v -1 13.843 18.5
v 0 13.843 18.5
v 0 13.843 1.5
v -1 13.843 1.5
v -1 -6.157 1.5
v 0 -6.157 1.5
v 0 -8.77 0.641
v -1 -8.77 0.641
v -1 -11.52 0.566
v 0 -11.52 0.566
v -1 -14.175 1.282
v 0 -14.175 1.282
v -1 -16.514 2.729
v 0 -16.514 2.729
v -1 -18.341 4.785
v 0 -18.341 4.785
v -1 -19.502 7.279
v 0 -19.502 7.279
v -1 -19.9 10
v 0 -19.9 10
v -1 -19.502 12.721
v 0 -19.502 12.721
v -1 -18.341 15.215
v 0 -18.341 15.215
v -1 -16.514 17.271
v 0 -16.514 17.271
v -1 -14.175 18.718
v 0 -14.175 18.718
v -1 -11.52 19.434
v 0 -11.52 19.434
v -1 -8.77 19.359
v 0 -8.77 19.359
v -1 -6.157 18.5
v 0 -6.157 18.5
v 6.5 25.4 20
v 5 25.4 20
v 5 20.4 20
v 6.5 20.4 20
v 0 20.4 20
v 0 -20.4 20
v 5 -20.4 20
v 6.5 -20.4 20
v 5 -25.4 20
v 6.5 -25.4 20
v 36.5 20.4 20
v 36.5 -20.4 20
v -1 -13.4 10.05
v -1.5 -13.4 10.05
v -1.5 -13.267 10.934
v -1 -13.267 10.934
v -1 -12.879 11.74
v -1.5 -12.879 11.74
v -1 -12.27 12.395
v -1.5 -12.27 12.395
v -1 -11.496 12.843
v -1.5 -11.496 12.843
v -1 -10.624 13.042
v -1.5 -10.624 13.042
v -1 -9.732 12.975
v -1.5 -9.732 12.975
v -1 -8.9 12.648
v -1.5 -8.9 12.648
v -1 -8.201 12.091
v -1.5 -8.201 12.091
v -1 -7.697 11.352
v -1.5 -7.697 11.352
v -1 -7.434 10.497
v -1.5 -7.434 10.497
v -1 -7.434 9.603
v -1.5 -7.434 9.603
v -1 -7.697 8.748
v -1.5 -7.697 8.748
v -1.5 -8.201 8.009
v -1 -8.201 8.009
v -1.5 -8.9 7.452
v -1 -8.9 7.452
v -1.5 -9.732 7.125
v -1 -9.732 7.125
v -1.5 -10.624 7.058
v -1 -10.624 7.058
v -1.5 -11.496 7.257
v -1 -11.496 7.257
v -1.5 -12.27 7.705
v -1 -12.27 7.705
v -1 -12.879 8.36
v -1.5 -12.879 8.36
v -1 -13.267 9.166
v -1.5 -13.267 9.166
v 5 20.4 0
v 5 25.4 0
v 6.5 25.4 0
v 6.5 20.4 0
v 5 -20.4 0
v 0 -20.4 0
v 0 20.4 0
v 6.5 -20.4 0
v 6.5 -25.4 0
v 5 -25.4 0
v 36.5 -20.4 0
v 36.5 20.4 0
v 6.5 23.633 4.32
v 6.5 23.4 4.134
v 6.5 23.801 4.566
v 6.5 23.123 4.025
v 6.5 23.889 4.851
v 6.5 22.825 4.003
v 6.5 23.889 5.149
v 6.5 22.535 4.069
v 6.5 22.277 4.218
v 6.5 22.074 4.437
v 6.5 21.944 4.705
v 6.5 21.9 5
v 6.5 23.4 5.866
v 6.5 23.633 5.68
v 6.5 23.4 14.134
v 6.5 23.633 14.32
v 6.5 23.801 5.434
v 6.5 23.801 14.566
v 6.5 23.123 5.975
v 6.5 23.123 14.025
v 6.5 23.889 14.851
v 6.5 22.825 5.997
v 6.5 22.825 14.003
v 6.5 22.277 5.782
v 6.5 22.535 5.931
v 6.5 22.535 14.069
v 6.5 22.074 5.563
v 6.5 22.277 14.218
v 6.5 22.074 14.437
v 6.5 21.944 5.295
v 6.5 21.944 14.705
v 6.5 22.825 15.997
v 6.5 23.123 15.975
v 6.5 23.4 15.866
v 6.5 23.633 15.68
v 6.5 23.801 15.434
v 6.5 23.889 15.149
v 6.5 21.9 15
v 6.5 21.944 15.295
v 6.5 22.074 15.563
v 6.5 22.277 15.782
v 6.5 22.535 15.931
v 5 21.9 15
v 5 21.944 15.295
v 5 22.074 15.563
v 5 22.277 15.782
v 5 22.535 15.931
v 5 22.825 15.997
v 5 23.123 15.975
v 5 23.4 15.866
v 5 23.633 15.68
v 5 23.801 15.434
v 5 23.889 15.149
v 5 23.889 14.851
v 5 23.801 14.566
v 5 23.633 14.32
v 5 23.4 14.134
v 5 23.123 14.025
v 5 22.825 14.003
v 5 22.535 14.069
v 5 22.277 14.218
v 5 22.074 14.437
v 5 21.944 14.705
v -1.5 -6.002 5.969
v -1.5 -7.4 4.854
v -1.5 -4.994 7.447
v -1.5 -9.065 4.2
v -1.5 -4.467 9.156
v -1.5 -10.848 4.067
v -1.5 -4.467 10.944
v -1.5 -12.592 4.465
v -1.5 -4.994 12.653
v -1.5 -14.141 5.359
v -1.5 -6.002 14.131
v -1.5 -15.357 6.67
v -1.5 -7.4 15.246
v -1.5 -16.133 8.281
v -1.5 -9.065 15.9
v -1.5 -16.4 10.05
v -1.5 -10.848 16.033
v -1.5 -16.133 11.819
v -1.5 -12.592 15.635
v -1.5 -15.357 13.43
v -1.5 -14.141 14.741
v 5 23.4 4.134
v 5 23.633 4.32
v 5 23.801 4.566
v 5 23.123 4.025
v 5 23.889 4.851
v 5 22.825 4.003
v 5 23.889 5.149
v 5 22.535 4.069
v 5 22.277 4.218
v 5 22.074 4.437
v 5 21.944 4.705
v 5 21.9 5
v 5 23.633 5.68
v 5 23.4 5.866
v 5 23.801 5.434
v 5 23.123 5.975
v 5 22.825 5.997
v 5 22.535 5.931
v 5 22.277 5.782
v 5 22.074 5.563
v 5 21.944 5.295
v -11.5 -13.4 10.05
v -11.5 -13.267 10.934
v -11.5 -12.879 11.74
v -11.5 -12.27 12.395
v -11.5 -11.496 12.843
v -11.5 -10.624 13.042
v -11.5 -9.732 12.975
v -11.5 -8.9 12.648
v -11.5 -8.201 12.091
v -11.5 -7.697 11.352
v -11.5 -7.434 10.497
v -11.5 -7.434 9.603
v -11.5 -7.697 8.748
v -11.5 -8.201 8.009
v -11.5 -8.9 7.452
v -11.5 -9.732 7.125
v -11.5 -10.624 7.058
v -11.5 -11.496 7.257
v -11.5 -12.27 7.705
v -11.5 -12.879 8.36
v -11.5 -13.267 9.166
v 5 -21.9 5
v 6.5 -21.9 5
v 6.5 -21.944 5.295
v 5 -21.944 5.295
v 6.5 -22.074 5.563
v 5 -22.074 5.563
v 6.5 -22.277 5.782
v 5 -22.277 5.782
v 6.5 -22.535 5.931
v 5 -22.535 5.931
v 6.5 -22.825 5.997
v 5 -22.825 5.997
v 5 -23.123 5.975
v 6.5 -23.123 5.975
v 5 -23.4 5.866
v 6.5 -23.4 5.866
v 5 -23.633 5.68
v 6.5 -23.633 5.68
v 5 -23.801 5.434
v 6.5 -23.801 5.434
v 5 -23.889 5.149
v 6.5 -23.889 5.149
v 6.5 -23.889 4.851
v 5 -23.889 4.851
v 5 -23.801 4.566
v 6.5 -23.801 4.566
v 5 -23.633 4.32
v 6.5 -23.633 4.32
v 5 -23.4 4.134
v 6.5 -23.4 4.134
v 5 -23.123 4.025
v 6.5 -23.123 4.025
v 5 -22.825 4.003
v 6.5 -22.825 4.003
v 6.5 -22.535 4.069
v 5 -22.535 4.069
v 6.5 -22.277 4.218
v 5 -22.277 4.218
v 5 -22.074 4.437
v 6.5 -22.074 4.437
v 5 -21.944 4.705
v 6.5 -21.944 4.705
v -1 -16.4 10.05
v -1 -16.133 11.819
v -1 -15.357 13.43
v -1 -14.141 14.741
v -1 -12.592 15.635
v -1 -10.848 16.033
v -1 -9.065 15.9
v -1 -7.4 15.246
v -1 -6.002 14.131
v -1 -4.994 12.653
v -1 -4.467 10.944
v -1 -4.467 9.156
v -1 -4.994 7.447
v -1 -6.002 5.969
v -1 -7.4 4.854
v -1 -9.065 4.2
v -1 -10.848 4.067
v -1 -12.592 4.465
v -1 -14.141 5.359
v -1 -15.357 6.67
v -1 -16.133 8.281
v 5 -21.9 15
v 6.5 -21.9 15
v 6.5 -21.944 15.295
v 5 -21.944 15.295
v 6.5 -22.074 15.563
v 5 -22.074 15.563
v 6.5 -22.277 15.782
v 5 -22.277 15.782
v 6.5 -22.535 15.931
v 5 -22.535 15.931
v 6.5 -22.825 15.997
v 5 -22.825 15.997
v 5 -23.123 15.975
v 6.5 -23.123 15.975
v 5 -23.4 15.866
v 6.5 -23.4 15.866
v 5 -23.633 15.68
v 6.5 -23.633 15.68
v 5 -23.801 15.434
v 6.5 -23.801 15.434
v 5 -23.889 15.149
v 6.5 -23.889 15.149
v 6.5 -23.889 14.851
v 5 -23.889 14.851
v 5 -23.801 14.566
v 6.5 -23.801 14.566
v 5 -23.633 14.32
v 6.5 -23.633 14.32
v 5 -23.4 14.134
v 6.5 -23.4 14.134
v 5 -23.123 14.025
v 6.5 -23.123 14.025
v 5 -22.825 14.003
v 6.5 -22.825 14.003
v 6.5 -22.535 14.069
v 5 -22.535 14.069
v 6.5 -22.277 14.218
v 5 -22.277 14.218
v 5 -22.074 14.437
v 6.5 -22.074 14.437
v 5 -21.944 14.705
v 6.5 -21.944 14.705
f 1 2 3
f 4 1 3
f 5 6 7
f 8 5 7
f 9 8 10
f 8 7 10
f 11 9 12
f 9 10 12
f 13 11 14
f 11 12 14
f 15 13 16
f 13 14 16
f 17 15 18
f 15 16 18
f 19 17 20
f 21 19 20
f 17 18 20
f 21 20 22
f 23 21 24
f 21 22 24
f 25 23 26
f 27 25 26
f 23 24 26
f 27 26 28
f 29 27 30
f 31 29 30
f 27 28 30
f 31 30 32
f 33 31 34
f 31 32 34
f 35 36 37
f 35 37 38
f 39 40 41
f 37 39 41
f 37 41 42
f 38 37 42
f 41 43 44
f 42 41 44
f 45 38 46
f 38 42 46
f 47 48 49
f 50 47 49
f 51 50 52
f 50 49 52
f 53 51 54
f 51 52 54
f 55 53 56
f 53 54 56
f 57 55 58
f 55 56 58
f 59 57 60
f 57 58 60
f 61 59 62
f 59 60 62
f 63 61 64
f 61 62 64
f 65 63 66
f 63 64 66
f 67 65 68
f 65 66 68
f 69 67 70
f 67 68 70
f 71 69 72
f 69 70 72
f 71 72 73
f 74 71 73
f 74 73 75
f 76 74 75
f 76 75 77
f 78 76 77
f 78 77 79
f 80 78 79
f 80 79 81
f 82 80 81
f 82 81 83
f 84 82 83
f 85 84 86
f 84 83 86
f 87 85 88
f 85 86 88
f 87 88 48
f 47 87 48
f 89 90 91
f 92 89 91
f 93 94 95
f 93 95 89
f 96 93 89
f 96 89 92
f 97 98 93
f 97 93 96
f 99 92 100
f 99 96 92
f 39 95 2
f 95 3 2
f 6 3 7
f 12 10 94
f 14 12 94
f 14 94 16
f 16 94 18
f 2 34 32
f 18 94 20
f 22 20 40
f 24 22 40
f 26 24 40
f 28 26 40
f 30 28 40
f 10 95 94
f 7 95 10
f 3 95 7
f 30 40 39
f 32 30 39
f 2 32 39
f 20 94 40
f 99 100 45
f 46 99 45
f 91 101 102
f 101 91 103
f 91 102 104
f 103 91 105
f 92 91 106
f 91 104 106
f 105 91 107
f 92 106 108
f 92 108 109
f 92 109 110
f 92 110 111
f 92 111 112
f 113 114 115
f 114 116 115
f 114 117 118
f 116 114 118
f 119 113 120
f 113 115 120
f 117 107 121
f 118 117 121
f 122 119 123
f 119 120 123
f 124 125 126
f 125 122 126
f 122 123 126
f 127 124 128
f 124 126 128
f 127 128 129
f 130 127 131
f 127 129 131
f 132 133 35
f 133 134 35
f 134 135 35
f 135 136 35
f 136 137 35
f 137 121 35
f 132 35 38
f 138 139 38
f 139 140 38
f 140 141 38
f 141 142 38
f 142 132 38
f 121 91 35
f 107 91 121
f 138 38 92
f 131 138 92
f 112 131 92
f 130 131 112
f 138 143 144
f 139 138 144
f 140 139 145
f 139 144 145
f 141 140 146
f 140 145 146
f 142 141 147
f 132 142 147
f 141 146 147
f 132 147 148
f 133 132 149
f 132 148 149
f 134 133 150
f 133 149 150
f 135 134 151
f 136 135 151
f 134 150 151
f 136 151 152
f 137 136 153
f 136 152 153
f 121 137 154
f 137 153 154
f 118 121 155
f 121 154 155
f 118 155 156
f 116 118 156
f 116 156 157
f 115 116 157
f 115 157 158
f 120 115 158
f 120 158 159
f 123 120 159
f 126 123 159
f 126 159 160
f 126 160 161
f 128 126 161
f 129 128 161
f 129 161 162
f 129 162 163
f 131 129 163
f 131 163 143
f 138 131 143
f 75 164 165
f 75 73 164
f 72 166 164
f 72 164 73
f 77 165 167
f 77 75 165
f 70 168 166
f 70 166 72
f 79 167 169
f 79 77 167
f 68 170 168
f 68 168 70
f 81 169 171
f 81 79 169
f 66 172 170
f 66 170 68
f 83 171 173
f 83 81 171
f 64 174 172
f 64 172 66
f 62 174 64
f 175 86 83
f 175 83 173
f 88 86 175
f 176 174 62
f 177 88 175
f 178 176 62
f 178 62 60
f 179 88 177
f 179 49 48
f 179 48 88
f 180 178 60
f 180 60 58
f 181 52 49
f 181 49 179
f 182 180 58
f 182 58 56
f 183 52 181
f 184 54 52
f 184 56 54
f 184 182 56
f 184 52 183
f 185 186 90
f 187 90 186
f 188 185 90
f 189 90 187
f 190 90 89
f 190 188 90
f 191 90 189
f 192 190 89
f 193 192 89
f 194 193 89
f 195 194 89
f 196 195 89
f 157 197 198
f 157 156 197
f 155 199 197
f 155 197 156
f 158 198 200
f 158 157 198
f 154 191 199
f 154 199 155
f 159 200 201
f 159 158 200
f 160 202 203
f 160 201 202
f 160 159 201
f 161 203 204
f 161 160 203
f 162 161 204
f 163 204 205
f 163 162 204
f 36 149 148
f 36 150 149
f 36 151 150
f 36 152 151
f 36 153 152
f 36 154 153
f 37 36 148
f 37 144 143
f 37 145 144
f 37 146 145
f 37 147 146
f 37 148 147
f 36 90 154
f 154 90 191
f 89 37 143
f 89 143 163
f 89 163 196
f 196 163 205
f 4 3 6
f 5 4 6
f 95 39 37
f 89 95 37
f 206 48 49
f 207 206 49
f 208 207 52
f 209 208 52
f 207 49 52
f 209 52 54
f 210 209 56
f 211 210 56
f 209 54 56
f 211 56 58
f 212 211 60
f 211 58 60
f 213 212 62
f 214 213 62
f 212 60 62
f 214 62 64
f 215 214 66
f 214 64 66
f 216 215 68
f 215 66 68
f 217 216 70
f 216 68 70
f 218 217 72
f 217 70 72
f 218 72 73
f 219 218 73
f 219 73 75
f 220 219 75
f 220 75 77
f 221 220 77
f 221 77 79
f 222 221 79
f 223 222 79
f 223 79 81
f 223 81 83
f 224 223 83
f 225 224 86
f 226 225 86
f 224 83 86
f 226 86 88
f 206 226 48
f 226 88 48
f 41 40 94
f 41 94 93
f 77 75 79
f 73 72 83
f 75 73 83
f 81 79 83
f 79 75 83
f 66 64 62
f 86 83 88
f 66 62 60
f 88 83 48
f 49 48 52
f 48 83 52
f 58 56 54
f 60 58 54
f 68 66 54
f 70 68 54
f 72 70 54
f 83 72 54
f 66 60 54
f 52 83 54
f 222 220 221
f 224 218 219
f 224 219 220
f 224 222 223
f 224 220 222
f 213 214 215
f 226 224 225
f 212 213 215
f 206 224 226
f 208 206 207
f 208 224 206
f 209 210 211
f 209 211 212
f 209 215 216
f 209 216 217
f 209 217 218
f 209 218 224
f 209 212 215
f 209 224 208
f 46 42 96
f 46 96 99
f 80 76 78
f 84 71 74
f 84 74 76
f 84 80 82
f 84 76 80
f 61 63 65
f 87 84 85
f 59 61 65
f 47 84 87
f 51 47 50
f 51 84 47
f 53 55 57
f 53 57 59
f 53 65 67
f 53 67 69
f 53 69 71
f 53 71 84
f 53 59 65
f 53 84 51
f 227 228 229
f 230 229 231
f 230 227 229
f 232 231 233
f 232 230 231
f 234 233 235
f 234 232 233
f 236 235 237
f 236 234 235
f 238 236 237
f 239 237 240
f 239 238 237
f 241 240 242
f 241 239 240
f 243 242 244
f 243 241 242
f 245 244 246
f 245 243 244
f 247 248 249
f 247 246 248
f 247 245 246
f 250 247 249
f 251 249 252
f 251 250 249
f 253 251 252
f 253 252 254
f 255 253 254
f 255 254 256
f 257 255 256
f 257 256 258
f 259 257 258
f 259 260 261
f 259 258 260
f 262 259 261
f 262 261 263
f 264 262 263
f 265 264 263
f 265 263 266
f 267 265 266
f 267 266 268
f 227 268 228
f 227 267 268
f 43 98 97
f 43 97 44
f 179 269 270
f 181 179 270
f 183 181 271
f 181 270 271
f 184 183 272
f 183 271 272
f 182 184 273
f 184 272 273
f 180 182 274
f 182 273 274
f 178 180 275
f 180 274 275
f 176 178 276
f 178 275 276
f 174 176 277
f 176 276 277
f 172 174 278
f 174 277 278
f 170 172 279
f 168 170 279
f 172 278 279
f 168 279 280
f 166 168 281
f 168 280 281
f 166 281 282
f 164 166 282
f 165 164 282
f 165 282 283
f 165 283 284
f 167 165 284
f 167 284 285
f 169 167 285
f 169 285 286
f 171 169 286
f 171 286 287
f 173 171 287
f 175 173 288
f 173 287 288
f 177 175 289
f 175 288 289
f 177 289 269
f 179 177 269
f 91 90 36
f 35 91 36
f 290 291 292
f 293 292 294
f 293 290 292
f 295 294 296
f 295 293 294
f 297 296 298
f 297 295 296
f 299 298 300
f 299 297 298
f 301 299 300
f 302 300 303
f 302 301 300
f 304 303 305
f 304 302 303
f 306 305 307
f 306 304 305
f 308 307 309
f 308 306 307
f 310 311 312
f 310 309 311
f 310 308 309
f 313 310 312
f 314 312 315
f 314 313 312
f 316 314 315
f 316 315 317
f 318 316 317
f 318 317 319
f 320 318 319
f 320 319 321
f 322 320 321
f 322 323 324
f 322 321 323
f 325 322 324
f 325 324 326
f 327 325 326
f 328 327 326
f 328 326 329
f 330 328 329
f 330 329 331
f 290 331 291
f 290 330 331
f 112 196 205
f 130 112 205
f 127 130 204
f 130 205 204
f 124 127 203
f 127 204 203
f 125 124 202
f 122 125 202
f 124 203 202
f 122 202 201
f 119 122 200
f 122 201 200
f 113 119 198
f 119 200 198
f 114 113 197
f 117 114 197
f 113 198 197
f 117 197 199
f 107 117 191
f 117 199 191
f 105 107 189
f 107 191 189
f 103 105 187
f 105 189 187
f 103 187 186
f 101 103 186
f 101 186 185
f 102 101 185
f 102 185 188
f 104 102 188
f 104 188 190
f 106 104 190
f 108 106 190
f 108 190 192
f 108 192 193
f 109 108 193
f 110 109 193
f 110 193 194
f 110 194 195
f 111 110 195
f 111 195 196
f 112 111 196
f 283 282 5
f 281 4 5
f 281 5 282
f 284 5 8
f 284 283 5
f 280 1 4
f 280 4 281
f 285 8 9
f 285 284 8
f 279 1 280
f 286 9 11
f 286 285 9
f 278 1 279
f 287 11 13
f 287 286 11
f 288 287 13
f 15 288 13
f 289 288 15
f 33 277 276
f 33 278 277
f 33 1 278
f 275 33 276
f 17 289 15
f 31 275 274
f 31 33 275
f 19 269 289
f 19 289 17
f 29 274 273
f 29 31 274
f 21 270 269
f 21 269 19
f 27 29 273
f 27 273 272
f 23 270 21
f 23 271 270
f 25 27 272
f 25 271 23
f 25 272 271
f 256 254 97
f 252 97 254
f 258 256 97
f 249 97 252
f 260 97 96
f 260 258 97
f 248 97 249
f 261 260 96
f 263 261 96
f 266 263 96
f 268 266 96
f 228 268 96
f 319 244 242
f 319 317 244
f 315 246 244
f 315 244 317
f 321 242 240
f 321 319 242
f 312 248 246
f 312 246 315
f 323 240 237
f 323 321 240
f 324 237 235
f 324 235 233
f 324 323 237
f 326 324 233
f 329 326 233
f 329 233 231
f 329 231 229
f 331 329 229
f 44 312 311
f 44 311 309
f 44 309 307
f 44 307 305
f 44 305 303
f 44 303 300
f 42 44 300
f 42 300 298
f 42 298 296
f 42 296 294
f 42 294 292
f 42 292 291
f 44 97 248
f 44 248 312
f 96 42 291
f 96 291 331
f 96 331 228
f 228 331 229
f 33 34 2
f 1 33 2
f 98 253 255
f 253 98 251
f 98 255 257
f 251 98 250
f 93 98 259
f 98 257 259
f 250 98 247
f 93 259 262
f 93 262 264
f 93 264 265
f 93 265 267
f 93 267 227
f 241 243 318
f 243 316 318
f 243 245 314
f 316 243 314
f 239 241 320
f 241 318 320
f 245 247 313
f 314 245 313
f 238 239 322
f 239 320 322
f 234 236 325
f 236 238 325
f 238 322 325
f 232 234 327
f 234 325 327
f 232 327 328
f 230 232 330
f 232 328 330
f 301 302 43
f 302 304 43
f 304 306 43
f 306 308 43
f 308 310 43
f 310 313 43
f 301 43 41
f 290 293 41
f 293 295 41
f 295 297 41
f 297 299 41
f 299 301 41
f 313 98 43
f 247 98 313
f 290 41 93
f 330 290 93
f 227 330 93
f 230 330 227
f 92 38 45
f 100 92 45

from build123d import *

# Parameters (mm, degrees)
F0_W      = 36.5
F0_H      = 20
F1_DEPTH  = 20.4
F3_W      = 5
F3_H      = 20
F4_DEPTH  = 1.5
F7_DEPTH  = 1
F8_R      = 6
F9_DEPTH  = 0.5
F10_R     = 3
F11_DEPTH = 0.5
F12_R     = 3
F13_DEPTH = 10
F14_R     = 1
F15_DEPTH = 25


# Not quite as in the source:
# - a pattern or mirror of a feature is missing from the dataset's text; its kind, count and spacing are read off the source's solid


with BuildPart() as f1:
    # F0 (on Front) → F1 (new body, symmetric)
    with BuildSketch(Plane.XZ):
        with Locations((18.25, 10)):
            Rectangle(F0_W, F0_H)
    extrude(amount=F1_DEPTH, both=True)

    # F3 (on offset) → F4 (join)
    with BuildSketch(Plane.YZ.offset(5)):
        with Locations((-22.9, 10)):
            Rectangle(F3_W, F3_H)
    extrude(amount=F4_DEPTH)


with BuildPart() as f5_1:
    # F5: instance of F1
    add(f1.part.mirror(Plane.XZ))


with BuildPart() as f1_1:
    add(f1.part)

    add(f5_1.part)  # F7 merges F5_1
    # F6 (on face) → F7 (join)
    with BuildSketch(Plane(origin=(0, 0, 0), x_dir=(0, -1, 0), z_dir=(-1, 0, 0))):
        with BuildLine():
            Line((-13.8426406871, 1.5), (6.1573593129, 1.5))
            ThreePointArc((6.1573593129, 1.5), (19.9, 10), (6.1573593129, 18.5))
            Line((6.1573593129, 18.5), (-13.8426406871, 18.5))
            Line((-13.8426406871, 18.5), (-13.8426406871, 1.5))
        make_face()
    extrude(amount=F7_DEPTH)

    # F8 (on face) → F9 (join)
    with BuildSketch(Plane(origin=(-1, 0, 0), x_dir=(0, -1, 0), z_dir=(-1, 0, 0))):
        with Locations((10.4, 10.05)):
            Circle(F8_R)
    extrude(amount=F9_DEPTH)

    # F10 (on face) → F11 (cut)
    with BuildSketch(Plane(origin=(-1.5, 0, 0), x_dir=(0, -1, 0), z_dir=(-1, 0, 0))):
        with Locations((10.4, 10.05)):
            Circle(F10_R)
    extrude(amount=-F11_DEPTH, mode=Mode.SUBTRACT)

    # F14 (on face) → F15 (cut)
    with BuildSketch(Plane(origin=(5, 0, 0), x_dir=(0, -1, 0), z_dir=(-1, 0, 0))):
        with Locations((-22.9, 5)):
            Circle(F14_R)
        with Locations((-22.9, 15)):
            Circle(F14_R)
    f15 = extrude(amount=-F15_DEPTH, mode=Mode.SUBTRACT)

    # F15_copies: F15 across plane
    add(f15.mirror(Plane(origin=(0, 0, 0), x_dir=(0, 0, -1), z_dir=(0, -1, 0))), mode=Mode.SUBTRACT)


with BuildPart() as f13:
    # F12 (on face) → F13 (new body)
    with BuildSketch(Plane(origin=(-1.5, 0, 0), x_dir=(0, -1, 0), z_dir=(-1, 0, 0))):
        with Locations((10.4, 10.05)):
            Circle(F12_R)
    extrude(amount=F13_DEPTH)


solid = Compound([f1_1.part, f13.part])
